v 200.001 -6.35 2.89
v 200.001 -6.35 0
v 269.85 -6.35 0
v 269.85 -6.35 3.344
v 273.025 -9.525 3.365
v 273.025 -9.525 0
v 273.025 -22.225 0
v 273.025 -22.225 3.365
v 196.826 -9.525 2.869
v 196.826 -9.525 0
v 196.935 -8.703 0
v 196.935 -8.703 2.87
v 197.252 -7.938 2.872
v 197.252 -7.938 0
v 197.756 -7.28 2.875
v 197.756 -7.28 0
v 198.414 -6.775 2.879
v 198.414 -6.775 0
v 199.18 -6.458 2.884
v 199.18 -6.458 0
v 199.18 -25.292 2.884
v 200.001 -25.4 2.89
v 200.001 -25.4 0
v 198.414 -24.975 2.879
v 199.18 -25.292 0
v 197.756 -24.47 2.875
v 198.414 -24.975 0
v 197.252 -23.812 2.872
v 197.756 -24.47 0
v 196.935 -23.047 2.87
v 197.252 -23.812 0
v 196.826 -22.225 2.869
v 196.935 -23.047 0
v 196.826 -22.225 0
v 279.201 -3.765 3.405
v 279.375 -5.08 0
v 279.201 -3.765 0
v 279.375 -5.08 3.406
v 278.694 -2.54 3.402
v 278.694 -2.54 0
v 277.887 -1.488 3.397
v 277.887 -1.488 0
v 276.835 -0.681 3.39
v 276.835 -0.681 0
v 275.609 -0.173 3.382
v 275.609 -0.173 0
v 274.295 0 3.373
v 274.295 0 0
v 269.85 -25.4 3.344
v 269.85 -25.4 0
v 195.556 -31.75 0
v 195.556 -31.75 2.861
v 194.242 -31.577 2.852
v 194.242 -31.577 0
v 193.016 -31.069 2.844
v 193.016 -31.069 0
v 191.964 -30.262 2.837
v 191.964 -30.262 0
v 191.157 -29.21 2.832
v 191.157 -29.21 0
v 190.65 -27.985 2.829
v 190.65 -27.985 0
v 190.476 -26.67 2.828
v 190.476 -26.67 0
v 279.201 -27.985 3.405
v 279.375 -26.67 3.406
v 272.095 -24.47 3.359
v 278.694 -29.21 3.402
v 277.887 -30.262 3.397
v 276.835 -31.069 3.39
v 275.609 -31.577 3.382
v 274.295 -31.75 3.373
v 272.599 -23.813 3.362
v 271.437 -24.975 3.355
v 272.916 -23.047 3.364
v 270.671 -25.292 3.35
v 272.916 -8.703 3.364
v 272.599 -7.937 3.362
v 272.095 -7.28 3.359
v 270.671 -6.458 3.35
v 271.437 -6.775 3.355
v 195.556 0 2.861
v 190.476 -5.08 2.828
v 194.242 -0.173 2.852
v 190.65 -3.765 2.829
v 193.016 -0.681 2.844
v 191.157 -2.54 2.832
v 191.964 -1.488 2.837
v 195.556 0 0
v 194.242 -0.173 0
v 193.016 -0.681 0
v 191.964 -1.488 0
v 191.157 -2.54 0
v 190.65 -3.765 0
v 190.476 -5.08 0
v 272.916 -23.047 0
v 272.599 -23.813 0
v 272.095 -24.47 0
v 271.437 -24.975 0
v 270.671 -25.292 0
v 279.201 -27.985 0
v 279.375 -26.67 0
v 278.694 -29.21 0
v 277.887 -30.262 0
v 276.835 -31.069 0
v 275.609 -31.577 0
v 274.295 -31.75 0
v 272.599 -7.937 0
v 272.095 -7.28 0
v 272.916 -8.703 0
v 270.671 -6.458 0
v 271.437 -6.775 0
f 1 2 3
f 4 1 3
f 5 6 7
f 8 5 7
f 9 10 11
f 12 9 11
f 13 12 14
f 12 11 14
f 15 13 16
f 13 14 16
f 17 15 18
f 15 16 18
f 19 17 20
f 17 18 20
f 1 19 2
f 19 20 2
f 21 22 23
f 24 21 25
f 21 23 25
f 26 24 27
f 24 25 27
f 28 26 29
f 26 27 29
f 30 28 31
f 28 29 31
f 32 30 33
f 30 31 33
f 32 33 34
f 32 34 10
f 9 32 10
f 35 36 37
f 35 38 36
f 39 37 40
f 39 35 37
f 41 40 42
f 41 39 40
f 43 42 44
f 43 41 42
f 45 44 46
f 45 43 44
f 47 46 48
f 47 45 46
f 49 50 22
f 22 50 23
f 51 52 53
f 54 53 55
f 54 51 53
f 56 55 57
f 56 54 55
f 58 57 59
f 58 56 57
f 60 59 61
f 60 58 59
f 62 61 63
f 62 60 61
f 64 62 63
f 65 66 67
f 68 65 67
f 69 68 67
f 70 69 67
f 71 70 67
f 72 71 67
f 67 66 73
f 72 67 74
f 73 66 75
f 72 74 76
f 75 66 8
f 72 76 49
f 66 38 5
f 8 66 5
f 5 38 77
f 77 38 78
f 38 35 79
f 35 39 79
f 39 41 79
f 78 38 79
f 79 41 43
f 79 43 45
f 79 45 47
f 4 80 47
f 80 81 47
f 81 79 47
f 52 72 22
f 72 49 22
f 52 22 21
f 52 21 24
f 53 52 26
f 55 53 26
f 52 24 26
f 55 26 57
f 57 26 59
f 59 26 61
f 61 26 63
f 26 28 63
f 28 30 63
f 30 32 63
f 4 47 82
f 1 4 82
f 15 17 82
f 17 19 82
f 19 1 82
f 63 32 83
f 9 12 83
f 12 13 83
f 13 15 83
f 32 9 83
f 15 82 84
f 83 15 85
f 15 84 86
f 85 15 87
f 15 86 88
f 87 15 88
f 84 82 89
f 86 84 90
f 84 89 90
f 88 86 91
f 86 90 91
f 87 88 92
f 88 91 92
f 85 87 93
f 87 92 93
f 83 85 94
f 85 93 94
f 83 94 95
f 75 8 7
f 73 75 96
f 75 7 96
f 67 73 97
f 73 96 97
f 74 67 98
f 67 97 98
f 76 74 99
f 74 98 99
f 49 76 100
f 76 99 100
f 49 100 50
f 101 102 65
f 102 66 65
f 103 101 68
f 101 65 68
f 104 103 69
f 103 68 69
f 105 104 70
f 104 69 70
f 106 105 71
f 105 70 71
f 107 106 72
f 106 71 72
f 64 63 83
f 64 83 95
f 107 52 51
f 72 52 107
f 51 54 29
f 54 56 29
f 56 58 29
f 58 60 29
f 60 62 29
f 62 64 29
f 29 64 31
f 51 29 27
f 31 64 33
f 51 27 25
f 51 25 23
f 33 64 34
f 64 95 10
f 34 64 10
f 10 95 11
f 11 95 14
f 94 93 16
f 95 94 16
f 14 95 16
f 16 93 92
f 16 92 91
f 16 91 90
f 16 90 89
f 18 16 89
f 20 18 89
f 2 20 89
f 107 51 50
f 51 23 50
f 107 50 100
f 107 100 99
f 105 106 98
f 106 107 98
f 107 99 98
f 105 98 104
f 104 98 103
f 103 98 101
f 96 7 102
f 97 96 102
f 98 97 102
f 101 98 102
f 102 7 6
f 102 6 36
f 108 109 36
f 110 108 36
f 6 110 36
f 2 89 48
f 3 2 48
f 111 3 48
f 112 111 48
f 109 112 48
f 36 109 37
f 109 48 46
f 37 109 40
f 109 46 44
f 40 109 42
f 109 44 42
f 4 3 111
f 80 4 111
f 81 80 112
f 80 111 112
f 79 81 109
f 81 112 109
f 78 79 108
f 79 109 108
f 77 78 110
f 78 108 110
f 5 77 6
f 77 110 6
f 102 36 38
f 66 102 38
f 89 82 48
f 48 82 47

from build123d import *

# Parameters (mm, degrees)
F4_DEPTH = 31.75
F6_DEPTH = 3.407345
F7_R     = 5.08


with BuildPart() as f4:
    # F3 (on face) → F4 (new body)
    with BuildSketch(Plane.XZ):
        Polygon((279.374593, 0), (279.374593, 3.406345), (190.476477, 2.827581), (190.476477, 0), align=None)
    extrude(amount=F4_DEPTH)

    # F5 (on face) → F6 (cut, through all)
    with BuildSketch(Plane(origin=(0, 0, 0), x_dir=(1, 0, 0), z_dir=(0, 0, -1))):
        with BuildLine():
            Line((269.849593, 25.4), (200.001477, 25.4))
            ThreePointArc((200.001477, 25.4), (197.756413, 24.470064), (196.826477, 22.225))
            Line((196.826477, 22.225), (196.826477, 9.525))
            ThreePointArc((196.826477, 9.525), (197.756413, 7.279936), (200.001477, 6.35))
            Line((200.001477, 6.35), (269.849593, 6.35))
            ThreePointArc((269.849593, 6.35), (272.094658, 7.279936), (273.024593, 9.525))
            Line((273.024593, 9.525), (273.024593, 22.225))
            ThreePointArc((273.024593, 22.225), (272.094658, 24.470064), (269.849593, 25.4))
        make_face()
    extrude(amount=-F6_DEPTH, mode=Mode.SUBTRACT)

    # F7
    f7_edges = [f4.edges().sort_by_distance(p)[0] for p in [
        (279.374593, -31.75, 1.703173),
        (190.476477, -31.75, 1.413791),
        (190.476477, 0, 1.413791),
        (279.374593, 0, 1.703173),
    ]]
    fillet(f7_edges, radius=F7_R)


solid = f4.part
